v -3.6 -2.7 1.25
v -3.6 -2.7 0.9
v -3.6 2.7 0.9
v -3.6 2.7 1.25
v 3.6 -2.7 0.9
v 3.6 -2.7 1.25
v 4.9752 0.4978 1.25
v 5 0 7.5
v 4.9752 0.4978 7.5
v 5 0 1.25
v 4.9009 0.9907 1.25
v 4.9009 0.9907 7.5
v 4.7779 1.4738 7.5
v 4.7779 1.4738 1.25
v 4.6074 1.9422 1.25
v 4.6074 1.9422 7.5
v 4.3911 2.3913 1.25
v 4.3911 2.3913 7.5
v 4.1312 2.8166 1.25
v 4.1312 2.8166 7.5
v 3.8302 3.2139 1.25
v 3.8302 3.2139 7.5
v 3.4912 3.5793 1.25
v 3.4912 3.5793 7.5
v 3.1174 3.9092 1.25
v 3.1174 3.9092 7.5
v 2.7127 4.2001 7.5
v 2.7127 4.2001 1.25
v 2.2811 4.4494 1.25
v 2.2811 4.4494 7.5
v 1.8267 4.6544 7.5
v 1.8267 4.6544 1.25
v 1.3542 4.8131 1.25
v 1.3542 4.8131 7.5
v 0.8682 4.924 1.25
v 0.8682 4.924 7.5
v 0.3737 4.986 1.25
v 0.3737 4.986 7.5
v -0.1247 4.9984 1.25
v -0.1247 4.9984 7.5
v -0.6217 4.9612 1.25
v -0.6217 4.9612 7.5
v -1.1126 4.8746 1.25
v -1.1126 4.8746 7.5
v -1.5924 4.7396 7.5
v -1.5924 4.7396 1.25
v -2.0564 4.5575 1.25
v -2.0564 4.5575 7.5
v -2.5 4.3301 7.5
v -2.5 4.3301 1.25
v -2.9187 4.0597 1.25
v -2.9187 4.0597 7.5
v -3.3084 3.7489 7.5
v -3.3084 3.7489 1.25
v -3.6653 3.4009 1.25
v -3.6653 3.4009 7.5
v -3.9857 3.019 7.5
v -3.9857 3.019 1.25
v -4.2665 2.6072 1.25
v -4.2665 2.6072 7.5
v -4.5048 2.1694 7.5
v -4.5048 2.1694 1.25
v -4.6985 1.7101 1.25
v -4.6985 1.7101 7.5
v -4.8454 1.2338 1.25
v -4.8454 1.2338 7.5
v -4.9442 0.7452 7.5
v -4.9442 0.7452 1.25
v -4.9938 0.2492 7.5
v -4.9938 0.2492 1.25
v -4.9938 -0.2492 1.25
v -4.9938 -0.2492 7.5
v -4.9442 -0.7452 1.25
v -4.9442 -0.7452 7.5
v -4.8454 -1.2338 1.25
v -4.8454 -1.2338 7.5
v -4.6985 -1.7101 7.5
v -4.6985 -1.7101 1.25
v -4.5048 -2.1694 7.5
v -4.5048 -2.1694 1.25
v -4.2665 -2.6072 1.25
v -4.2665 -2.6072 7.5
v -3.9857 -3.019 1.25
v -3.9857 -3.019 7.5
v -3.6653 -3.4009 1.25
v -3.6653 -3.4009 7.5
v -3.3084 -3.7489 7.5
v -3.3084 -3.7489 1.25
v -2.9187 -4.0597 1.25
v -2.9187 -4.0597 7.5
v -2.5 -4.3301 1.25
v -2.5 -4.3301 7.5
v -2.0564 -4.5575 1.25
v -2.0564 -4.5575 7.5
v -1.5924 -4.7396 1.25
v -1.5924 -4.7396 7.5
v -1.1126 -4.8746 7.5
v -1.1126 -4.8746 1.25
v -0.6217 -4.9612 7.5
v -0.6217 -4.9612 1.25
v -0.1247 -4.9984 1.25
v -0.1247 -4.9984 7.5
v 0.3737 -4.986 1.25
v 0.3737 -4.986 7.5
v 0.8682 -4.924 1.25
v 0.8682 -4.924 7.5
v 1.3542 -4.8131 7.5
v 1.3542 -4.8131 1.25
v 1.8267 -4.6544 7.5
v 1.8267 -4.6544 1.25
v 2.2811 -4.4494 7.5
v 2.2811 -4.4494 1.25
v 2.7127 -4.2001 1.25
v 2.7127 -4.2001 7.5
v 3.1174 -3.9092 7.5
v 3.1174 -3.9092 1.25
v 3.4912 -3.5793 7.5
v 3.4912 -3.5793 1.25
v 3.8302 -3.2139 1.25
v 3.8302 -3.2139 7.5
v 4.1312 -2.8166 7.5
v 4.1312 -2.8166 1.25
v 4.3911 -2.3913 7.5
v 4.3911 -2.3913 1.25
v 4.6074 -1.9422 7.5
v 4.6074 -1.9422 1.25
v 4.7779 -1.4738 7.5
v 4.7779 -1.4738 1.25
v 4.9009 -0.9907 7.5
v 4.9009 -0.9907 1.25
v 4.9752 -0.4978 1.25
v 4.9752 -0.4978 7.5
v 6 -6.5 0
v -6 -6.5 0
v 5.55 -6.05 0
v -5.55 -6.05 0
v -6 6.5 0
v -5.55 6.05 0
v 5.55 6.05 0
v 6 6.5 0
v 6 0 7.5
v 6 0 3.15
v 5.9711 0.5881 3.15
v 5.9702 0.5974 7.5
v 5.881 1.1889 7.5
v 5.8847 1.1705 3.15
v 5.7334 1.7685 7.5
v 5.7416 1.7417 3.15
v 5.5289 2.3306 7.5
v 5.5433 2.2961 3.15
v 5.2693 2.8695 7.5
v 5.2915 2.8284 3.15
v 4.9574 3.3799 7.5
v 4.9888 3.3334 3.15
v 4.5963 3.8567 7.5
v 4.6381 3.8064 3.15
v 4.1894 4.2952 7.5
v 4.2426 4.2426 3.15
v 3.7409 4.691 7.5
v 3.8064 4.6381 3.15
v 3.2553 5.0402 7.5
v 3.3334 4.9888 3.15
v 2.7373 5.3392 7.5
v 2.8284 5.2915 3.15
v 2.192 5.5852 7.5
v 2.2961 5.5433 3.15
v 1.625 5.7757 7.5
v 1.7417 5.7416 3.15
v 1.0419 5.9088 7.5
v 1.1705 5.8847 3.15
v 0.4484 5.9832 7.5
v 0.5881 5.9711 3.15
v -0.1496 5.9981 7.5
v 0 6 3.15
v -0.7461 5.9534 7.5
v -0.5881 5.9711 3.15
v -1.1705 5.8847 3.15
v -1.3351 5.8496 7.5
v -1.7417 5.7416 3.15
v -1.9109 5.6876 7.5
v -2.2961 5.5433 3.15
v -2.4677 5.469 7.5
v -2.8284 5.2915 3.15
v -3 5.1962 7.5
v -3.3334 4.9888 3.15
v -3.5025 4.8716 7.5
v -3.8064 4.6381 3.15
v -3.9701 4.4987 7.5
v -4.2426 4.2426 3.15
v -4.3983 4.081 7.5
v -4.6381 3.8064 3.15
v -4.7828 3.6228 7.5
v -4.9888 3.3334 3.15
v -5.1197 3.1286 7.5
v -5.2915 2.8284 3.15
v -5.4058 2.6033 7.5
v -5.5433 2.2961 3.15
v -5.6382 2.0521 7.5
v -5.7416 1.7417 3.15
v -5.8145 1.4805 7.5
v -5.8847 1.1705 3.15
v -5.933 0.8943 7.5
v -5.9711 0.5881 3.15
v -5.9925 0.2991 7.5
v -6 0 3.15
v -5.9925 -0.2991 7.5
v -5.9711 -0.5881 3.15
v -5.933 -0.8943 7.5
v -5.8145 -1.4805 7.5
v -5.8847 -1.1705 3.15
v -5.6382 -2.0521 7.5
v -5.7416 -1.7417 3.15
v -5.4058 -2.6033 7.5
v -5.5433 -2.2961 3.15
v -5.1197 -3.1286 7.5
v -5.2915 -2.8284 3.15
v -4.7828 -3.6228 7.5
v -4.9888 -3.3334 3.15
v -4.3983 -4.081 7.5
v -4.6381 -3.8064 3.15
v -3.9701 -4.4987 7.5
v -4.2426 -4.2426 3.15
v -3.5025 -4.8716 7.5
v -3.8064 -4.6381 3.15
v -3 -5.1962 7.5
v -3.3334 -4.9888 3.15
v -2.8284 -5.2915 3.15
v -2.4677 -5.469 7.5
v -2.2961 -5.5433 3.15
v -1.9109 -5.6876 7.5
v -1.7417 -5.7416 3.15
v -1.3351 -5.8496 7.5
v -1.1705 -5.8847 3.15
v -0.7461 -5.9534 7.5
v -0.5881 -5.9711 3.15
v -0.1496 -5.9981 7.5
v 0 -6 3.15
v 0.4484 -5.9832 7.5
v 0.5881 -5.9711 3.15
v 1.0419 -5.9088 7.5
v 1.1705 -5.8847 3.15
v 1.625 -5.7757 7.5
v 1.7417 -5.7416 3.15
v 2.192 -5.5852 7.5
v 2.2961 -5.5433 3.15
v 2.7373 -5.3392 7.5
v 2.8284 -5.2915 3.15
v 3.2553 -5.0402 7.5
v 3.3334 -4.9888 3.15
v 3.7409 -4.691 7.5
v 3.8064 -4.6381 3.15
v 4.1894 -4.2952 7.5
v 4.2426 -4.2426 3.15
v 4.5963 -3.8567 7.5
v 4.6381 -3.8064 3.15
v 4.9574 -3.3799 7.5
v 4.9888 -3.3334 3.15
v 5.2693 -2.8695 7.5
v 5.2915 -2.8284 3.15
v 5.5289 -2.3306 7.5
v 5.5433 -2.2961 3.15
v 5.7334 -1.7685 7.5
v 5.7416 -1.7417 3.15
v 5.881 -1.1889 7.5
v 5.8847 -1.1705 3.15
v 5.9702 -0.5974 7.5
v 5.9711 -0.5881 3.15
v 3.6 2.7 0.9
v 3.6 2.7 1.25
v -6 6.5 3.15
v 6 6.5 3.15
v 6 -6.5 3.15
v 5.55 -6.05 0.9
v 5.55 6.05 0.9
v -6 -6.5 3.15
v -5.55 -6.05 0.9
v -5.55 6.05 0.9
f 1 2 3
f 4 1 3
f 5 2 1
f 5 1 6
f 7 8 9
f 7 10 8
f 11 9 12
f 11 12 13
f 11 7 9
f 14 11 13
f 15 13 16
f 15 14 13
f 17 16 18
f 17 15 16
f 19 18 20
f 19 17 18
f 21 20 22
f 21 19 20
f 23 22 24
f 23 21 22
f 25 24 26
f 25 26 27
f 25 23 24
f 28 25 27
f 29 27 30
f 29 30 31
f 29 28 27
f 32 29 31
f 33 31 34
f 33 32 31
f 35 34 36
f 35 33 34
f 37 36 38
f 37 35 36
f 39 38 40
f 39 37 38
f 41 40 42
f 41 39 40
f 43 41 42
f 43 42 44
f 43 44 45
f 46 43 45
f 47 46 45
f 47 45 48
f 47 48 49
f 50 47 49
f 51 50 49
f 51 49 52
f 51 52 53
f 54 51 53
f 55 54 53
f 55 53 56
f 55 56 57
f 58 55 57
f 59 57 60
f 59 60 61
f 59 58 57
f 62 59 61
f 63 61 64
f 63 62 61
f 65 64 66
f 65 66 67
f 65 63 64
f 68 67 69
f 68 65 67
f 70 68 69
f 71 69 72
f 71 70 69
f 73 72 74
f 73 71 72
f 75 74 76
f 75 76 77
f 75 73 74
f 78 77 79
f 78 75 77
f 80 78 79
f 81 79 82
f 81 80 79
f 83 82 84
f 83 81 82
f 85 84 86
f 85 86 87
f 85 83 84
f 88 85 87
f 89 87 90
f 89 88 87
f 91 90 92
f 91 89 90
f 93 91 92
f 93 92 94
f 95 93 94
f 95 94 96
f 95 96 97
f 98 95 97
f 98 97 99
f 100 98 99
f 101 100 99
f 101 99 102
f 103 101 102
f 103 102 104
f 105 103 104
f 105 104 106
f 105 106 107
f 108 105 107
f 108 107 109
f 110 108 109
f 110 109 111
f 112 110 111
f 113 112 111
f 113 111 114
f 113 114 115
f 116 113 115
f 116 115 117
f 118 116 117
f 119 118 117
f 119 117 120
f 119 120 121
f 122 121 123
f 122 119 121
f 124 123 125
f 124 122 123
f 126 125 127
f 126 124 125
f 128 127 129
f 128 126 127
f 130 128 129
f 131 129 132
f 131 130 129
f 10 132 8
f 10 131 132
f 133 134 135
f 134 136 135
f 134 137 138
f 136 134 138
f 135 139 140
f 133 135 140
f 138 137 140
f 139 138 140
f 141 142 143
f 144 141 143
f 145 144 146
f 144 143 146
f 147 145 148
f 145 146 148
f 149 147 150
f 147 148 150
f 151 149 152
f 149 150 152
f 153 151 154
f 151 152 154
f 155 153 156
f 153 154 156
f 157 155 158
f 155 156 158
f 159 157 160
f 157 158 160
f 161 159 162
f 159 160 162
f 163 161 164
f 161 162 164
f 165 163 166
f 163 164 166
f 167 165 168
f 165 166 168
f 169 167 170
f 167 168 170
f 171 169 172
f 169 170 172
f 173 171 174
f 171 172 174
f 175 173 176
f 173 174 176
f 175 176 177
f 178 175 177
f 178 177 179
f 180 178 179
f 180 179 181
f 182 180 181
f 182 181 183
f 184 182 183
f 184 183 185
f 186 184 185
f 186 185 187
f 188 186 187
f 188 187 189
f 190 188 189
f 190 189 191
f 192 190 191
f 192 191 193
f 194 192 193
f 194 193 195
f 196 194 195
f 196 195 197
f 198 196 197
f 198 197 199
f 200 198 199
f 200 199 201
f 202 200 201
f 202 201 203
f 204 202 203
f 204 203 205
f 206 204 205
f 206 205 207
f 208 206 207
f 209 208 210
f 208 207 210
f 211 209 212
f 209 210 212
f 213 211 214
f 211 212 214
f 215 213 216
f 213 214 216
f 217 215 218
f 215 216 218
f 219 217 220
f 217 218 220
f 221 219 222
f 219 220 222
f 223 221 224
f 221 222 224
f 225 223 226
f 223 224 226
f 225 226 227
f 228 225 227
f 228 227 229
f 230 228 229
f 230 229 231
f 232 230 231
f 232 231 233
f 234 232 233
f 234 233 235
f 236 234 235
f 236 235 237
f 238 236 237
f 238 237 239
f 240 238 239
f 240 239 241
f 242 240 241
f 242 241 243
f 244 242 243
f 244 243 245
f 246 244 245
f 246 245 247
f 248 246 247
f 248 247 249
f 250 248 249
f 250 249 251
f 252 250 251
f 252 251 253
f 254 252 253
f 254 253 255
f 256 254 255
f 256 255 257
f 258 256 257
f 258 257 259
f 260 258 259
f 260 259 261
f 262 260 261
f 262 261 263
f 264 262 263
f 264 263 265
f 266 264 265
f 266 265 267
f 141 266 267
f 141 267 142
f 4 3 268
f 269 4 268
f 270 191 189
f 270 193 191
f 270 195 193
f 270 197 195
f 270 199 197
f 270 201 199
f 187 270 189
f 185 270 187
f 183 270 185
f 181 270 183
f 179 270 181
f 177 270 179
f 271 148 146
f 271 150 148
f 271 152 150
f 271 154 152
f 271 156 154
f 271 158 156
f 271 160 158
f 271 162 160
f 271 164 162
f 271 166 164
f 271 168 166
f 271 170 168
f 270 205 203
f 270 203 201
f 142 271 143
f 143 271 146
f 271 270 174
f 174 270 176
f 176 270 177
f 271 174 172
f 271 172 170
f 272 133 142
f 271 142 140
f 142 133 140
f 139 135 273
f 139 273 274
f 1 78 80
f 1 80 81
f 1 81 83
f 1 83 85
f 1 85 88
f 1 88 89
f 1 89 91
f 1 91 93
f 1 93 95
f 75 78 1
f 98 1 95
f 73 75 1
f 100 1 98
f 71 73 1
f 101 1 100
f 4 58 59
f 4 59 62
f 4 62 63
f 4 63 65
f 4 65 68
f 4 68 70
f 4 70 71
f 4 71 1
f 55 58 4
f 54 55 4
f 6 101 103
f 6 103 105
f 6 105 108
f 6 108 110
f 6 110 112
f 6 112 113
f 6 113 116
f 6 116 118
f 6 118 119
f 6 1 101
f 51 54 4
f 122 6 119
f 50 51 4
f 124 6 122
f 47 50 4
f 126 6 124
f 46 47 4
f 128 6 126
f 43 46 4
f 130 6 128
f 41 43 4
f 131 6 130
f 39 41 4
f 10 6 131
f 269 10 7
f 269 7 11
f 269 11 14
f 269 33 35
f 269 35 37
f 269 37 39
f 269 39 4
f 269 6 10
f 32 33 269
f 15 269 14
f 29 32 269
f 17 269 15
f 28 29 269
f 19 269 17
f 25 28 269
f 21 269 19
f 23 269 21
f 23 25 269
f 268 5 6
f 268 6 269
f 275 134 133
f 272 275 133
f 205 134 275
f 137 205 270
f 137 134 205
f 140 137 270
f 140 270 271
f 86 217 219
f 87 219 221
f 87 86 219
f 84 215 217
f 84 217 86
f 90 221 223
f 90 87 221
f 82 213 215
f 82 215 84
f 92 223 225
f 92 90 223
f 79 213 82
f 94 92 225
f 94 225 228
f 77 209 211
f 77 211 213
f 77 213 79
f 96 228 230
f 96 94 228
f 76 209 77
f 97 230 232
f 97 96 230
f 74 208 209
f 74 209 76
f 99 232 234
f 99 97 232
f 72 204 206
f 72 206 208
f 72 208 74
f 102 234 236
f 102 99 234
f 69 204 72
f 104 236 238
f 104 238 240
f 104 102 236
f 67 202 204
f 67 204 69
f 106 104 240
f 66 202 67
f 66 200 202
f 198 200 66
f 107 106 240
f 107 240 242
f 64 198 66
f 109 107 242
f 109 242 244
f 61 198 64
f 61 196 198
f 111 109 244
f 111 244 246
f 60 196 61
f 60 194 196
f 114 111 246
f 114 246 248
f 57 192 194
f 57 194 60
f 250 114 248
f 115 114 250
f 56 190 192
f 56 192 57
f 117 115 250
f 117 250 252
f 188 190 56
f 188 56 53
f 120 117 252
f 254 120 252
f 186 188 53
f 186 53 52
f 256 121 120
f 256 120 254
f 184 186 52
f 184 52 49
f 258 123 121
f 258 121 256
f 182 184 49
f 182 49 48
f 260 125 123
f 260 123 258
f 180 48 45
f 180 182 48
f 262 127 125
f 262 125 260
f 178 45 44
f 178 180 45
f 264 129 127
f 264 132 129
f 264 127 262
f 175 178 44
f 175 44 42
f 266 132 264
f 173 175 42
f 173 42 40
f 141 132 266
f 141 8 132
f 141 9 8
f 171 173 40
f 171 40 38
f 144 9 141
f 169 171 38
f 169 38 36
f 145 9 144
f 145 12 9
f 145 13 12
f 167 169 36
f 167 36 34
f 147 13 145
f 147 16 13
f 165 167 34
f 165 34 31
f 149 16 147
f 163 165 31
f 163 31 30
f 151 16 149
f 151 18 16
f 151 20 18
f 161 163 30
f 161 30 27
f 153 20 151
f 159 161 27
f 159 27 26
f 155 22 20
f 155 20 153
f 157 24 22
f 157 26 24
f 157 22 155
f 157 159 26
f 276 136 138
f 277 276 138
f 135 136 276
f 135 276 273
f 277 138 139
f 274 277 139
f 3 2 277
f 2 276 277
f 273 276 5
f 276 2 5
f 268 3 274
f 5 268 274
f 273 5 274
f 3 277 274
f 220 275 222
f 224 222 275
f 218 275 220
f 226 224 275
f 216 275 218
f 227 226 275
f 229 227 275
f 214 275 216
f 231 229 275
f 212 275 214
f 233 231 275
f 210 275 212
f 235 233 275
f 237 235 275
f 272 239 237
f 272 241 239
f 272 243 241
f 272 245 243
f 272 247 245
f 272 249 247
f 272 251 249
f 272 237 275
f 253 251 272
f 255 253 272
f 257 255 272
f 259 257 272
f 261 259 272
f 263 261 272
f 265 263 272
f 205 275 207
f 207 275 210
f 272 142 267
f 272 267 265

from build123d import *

# Parameters (mm, degrees)
F0_W     = 12
F0_H     = 13
F0_W_2   = 11.1
F0_H_2   = 12.1
F0_W_3   = 7.2
F0_H_3   = 5.4
F1_DEPTH = 3.15
F2_DEPTH = 0.9
F3_R     = 5
F4_DEPTH = 4.35
F5_DEPTH = 1.9


with BuildPart() as f1:
    # F0 (on Top) → F1 (new body)
    with BuildSketch(Plane.XY):
        Rectangle(F0_W, F0_H)
        Rectangle(F0_W_2, F0_H_2, mode=Mode.SUBTRACT)
        Rectangle(F0_W_2, F0_H_2)
        Rectangle(F0_W_3, F0_H_3, mode=Mode.SUBTRACT)
    extrude(amount=F1_DEPTH)

    # F0 (on Top) → F2 (cut)
    with BuildSketch(Plane.XY):
        Rectangle(F0_W_2, F0_H_2)
        Rectangle(F0_W_3, F0_H_3, mode=Mode.SUBTRACT)
    extrude(amount=F2_DEPTH, mode=Mode.SUBTRACT)

    # F3 (on face) → F4 (join)
    with BuildSketch(Plane.XY.offset(3.15)):
        with BuildLine():
            ThreePointArc((-6, 0), (0, -6), (6, 0))
            ThreePointArc((6, 0), (0, 6), (-6, 0))
        make_face()
        Circle(F3_R, mode=Mode.SUBTRACT)
    extrude(amount=F4_DEPTH)

    # F5 (cut): a face of the model
    f5_faces = [f1.faces().sort_by_distance(p)[0] for p in [
        (-4.8585786438, 0, 3.15),
    ]]
    extrude(f5_faces, amount=-F5_DEPTH, mode=Mode.SUBTRACT)


solid = f1.part
